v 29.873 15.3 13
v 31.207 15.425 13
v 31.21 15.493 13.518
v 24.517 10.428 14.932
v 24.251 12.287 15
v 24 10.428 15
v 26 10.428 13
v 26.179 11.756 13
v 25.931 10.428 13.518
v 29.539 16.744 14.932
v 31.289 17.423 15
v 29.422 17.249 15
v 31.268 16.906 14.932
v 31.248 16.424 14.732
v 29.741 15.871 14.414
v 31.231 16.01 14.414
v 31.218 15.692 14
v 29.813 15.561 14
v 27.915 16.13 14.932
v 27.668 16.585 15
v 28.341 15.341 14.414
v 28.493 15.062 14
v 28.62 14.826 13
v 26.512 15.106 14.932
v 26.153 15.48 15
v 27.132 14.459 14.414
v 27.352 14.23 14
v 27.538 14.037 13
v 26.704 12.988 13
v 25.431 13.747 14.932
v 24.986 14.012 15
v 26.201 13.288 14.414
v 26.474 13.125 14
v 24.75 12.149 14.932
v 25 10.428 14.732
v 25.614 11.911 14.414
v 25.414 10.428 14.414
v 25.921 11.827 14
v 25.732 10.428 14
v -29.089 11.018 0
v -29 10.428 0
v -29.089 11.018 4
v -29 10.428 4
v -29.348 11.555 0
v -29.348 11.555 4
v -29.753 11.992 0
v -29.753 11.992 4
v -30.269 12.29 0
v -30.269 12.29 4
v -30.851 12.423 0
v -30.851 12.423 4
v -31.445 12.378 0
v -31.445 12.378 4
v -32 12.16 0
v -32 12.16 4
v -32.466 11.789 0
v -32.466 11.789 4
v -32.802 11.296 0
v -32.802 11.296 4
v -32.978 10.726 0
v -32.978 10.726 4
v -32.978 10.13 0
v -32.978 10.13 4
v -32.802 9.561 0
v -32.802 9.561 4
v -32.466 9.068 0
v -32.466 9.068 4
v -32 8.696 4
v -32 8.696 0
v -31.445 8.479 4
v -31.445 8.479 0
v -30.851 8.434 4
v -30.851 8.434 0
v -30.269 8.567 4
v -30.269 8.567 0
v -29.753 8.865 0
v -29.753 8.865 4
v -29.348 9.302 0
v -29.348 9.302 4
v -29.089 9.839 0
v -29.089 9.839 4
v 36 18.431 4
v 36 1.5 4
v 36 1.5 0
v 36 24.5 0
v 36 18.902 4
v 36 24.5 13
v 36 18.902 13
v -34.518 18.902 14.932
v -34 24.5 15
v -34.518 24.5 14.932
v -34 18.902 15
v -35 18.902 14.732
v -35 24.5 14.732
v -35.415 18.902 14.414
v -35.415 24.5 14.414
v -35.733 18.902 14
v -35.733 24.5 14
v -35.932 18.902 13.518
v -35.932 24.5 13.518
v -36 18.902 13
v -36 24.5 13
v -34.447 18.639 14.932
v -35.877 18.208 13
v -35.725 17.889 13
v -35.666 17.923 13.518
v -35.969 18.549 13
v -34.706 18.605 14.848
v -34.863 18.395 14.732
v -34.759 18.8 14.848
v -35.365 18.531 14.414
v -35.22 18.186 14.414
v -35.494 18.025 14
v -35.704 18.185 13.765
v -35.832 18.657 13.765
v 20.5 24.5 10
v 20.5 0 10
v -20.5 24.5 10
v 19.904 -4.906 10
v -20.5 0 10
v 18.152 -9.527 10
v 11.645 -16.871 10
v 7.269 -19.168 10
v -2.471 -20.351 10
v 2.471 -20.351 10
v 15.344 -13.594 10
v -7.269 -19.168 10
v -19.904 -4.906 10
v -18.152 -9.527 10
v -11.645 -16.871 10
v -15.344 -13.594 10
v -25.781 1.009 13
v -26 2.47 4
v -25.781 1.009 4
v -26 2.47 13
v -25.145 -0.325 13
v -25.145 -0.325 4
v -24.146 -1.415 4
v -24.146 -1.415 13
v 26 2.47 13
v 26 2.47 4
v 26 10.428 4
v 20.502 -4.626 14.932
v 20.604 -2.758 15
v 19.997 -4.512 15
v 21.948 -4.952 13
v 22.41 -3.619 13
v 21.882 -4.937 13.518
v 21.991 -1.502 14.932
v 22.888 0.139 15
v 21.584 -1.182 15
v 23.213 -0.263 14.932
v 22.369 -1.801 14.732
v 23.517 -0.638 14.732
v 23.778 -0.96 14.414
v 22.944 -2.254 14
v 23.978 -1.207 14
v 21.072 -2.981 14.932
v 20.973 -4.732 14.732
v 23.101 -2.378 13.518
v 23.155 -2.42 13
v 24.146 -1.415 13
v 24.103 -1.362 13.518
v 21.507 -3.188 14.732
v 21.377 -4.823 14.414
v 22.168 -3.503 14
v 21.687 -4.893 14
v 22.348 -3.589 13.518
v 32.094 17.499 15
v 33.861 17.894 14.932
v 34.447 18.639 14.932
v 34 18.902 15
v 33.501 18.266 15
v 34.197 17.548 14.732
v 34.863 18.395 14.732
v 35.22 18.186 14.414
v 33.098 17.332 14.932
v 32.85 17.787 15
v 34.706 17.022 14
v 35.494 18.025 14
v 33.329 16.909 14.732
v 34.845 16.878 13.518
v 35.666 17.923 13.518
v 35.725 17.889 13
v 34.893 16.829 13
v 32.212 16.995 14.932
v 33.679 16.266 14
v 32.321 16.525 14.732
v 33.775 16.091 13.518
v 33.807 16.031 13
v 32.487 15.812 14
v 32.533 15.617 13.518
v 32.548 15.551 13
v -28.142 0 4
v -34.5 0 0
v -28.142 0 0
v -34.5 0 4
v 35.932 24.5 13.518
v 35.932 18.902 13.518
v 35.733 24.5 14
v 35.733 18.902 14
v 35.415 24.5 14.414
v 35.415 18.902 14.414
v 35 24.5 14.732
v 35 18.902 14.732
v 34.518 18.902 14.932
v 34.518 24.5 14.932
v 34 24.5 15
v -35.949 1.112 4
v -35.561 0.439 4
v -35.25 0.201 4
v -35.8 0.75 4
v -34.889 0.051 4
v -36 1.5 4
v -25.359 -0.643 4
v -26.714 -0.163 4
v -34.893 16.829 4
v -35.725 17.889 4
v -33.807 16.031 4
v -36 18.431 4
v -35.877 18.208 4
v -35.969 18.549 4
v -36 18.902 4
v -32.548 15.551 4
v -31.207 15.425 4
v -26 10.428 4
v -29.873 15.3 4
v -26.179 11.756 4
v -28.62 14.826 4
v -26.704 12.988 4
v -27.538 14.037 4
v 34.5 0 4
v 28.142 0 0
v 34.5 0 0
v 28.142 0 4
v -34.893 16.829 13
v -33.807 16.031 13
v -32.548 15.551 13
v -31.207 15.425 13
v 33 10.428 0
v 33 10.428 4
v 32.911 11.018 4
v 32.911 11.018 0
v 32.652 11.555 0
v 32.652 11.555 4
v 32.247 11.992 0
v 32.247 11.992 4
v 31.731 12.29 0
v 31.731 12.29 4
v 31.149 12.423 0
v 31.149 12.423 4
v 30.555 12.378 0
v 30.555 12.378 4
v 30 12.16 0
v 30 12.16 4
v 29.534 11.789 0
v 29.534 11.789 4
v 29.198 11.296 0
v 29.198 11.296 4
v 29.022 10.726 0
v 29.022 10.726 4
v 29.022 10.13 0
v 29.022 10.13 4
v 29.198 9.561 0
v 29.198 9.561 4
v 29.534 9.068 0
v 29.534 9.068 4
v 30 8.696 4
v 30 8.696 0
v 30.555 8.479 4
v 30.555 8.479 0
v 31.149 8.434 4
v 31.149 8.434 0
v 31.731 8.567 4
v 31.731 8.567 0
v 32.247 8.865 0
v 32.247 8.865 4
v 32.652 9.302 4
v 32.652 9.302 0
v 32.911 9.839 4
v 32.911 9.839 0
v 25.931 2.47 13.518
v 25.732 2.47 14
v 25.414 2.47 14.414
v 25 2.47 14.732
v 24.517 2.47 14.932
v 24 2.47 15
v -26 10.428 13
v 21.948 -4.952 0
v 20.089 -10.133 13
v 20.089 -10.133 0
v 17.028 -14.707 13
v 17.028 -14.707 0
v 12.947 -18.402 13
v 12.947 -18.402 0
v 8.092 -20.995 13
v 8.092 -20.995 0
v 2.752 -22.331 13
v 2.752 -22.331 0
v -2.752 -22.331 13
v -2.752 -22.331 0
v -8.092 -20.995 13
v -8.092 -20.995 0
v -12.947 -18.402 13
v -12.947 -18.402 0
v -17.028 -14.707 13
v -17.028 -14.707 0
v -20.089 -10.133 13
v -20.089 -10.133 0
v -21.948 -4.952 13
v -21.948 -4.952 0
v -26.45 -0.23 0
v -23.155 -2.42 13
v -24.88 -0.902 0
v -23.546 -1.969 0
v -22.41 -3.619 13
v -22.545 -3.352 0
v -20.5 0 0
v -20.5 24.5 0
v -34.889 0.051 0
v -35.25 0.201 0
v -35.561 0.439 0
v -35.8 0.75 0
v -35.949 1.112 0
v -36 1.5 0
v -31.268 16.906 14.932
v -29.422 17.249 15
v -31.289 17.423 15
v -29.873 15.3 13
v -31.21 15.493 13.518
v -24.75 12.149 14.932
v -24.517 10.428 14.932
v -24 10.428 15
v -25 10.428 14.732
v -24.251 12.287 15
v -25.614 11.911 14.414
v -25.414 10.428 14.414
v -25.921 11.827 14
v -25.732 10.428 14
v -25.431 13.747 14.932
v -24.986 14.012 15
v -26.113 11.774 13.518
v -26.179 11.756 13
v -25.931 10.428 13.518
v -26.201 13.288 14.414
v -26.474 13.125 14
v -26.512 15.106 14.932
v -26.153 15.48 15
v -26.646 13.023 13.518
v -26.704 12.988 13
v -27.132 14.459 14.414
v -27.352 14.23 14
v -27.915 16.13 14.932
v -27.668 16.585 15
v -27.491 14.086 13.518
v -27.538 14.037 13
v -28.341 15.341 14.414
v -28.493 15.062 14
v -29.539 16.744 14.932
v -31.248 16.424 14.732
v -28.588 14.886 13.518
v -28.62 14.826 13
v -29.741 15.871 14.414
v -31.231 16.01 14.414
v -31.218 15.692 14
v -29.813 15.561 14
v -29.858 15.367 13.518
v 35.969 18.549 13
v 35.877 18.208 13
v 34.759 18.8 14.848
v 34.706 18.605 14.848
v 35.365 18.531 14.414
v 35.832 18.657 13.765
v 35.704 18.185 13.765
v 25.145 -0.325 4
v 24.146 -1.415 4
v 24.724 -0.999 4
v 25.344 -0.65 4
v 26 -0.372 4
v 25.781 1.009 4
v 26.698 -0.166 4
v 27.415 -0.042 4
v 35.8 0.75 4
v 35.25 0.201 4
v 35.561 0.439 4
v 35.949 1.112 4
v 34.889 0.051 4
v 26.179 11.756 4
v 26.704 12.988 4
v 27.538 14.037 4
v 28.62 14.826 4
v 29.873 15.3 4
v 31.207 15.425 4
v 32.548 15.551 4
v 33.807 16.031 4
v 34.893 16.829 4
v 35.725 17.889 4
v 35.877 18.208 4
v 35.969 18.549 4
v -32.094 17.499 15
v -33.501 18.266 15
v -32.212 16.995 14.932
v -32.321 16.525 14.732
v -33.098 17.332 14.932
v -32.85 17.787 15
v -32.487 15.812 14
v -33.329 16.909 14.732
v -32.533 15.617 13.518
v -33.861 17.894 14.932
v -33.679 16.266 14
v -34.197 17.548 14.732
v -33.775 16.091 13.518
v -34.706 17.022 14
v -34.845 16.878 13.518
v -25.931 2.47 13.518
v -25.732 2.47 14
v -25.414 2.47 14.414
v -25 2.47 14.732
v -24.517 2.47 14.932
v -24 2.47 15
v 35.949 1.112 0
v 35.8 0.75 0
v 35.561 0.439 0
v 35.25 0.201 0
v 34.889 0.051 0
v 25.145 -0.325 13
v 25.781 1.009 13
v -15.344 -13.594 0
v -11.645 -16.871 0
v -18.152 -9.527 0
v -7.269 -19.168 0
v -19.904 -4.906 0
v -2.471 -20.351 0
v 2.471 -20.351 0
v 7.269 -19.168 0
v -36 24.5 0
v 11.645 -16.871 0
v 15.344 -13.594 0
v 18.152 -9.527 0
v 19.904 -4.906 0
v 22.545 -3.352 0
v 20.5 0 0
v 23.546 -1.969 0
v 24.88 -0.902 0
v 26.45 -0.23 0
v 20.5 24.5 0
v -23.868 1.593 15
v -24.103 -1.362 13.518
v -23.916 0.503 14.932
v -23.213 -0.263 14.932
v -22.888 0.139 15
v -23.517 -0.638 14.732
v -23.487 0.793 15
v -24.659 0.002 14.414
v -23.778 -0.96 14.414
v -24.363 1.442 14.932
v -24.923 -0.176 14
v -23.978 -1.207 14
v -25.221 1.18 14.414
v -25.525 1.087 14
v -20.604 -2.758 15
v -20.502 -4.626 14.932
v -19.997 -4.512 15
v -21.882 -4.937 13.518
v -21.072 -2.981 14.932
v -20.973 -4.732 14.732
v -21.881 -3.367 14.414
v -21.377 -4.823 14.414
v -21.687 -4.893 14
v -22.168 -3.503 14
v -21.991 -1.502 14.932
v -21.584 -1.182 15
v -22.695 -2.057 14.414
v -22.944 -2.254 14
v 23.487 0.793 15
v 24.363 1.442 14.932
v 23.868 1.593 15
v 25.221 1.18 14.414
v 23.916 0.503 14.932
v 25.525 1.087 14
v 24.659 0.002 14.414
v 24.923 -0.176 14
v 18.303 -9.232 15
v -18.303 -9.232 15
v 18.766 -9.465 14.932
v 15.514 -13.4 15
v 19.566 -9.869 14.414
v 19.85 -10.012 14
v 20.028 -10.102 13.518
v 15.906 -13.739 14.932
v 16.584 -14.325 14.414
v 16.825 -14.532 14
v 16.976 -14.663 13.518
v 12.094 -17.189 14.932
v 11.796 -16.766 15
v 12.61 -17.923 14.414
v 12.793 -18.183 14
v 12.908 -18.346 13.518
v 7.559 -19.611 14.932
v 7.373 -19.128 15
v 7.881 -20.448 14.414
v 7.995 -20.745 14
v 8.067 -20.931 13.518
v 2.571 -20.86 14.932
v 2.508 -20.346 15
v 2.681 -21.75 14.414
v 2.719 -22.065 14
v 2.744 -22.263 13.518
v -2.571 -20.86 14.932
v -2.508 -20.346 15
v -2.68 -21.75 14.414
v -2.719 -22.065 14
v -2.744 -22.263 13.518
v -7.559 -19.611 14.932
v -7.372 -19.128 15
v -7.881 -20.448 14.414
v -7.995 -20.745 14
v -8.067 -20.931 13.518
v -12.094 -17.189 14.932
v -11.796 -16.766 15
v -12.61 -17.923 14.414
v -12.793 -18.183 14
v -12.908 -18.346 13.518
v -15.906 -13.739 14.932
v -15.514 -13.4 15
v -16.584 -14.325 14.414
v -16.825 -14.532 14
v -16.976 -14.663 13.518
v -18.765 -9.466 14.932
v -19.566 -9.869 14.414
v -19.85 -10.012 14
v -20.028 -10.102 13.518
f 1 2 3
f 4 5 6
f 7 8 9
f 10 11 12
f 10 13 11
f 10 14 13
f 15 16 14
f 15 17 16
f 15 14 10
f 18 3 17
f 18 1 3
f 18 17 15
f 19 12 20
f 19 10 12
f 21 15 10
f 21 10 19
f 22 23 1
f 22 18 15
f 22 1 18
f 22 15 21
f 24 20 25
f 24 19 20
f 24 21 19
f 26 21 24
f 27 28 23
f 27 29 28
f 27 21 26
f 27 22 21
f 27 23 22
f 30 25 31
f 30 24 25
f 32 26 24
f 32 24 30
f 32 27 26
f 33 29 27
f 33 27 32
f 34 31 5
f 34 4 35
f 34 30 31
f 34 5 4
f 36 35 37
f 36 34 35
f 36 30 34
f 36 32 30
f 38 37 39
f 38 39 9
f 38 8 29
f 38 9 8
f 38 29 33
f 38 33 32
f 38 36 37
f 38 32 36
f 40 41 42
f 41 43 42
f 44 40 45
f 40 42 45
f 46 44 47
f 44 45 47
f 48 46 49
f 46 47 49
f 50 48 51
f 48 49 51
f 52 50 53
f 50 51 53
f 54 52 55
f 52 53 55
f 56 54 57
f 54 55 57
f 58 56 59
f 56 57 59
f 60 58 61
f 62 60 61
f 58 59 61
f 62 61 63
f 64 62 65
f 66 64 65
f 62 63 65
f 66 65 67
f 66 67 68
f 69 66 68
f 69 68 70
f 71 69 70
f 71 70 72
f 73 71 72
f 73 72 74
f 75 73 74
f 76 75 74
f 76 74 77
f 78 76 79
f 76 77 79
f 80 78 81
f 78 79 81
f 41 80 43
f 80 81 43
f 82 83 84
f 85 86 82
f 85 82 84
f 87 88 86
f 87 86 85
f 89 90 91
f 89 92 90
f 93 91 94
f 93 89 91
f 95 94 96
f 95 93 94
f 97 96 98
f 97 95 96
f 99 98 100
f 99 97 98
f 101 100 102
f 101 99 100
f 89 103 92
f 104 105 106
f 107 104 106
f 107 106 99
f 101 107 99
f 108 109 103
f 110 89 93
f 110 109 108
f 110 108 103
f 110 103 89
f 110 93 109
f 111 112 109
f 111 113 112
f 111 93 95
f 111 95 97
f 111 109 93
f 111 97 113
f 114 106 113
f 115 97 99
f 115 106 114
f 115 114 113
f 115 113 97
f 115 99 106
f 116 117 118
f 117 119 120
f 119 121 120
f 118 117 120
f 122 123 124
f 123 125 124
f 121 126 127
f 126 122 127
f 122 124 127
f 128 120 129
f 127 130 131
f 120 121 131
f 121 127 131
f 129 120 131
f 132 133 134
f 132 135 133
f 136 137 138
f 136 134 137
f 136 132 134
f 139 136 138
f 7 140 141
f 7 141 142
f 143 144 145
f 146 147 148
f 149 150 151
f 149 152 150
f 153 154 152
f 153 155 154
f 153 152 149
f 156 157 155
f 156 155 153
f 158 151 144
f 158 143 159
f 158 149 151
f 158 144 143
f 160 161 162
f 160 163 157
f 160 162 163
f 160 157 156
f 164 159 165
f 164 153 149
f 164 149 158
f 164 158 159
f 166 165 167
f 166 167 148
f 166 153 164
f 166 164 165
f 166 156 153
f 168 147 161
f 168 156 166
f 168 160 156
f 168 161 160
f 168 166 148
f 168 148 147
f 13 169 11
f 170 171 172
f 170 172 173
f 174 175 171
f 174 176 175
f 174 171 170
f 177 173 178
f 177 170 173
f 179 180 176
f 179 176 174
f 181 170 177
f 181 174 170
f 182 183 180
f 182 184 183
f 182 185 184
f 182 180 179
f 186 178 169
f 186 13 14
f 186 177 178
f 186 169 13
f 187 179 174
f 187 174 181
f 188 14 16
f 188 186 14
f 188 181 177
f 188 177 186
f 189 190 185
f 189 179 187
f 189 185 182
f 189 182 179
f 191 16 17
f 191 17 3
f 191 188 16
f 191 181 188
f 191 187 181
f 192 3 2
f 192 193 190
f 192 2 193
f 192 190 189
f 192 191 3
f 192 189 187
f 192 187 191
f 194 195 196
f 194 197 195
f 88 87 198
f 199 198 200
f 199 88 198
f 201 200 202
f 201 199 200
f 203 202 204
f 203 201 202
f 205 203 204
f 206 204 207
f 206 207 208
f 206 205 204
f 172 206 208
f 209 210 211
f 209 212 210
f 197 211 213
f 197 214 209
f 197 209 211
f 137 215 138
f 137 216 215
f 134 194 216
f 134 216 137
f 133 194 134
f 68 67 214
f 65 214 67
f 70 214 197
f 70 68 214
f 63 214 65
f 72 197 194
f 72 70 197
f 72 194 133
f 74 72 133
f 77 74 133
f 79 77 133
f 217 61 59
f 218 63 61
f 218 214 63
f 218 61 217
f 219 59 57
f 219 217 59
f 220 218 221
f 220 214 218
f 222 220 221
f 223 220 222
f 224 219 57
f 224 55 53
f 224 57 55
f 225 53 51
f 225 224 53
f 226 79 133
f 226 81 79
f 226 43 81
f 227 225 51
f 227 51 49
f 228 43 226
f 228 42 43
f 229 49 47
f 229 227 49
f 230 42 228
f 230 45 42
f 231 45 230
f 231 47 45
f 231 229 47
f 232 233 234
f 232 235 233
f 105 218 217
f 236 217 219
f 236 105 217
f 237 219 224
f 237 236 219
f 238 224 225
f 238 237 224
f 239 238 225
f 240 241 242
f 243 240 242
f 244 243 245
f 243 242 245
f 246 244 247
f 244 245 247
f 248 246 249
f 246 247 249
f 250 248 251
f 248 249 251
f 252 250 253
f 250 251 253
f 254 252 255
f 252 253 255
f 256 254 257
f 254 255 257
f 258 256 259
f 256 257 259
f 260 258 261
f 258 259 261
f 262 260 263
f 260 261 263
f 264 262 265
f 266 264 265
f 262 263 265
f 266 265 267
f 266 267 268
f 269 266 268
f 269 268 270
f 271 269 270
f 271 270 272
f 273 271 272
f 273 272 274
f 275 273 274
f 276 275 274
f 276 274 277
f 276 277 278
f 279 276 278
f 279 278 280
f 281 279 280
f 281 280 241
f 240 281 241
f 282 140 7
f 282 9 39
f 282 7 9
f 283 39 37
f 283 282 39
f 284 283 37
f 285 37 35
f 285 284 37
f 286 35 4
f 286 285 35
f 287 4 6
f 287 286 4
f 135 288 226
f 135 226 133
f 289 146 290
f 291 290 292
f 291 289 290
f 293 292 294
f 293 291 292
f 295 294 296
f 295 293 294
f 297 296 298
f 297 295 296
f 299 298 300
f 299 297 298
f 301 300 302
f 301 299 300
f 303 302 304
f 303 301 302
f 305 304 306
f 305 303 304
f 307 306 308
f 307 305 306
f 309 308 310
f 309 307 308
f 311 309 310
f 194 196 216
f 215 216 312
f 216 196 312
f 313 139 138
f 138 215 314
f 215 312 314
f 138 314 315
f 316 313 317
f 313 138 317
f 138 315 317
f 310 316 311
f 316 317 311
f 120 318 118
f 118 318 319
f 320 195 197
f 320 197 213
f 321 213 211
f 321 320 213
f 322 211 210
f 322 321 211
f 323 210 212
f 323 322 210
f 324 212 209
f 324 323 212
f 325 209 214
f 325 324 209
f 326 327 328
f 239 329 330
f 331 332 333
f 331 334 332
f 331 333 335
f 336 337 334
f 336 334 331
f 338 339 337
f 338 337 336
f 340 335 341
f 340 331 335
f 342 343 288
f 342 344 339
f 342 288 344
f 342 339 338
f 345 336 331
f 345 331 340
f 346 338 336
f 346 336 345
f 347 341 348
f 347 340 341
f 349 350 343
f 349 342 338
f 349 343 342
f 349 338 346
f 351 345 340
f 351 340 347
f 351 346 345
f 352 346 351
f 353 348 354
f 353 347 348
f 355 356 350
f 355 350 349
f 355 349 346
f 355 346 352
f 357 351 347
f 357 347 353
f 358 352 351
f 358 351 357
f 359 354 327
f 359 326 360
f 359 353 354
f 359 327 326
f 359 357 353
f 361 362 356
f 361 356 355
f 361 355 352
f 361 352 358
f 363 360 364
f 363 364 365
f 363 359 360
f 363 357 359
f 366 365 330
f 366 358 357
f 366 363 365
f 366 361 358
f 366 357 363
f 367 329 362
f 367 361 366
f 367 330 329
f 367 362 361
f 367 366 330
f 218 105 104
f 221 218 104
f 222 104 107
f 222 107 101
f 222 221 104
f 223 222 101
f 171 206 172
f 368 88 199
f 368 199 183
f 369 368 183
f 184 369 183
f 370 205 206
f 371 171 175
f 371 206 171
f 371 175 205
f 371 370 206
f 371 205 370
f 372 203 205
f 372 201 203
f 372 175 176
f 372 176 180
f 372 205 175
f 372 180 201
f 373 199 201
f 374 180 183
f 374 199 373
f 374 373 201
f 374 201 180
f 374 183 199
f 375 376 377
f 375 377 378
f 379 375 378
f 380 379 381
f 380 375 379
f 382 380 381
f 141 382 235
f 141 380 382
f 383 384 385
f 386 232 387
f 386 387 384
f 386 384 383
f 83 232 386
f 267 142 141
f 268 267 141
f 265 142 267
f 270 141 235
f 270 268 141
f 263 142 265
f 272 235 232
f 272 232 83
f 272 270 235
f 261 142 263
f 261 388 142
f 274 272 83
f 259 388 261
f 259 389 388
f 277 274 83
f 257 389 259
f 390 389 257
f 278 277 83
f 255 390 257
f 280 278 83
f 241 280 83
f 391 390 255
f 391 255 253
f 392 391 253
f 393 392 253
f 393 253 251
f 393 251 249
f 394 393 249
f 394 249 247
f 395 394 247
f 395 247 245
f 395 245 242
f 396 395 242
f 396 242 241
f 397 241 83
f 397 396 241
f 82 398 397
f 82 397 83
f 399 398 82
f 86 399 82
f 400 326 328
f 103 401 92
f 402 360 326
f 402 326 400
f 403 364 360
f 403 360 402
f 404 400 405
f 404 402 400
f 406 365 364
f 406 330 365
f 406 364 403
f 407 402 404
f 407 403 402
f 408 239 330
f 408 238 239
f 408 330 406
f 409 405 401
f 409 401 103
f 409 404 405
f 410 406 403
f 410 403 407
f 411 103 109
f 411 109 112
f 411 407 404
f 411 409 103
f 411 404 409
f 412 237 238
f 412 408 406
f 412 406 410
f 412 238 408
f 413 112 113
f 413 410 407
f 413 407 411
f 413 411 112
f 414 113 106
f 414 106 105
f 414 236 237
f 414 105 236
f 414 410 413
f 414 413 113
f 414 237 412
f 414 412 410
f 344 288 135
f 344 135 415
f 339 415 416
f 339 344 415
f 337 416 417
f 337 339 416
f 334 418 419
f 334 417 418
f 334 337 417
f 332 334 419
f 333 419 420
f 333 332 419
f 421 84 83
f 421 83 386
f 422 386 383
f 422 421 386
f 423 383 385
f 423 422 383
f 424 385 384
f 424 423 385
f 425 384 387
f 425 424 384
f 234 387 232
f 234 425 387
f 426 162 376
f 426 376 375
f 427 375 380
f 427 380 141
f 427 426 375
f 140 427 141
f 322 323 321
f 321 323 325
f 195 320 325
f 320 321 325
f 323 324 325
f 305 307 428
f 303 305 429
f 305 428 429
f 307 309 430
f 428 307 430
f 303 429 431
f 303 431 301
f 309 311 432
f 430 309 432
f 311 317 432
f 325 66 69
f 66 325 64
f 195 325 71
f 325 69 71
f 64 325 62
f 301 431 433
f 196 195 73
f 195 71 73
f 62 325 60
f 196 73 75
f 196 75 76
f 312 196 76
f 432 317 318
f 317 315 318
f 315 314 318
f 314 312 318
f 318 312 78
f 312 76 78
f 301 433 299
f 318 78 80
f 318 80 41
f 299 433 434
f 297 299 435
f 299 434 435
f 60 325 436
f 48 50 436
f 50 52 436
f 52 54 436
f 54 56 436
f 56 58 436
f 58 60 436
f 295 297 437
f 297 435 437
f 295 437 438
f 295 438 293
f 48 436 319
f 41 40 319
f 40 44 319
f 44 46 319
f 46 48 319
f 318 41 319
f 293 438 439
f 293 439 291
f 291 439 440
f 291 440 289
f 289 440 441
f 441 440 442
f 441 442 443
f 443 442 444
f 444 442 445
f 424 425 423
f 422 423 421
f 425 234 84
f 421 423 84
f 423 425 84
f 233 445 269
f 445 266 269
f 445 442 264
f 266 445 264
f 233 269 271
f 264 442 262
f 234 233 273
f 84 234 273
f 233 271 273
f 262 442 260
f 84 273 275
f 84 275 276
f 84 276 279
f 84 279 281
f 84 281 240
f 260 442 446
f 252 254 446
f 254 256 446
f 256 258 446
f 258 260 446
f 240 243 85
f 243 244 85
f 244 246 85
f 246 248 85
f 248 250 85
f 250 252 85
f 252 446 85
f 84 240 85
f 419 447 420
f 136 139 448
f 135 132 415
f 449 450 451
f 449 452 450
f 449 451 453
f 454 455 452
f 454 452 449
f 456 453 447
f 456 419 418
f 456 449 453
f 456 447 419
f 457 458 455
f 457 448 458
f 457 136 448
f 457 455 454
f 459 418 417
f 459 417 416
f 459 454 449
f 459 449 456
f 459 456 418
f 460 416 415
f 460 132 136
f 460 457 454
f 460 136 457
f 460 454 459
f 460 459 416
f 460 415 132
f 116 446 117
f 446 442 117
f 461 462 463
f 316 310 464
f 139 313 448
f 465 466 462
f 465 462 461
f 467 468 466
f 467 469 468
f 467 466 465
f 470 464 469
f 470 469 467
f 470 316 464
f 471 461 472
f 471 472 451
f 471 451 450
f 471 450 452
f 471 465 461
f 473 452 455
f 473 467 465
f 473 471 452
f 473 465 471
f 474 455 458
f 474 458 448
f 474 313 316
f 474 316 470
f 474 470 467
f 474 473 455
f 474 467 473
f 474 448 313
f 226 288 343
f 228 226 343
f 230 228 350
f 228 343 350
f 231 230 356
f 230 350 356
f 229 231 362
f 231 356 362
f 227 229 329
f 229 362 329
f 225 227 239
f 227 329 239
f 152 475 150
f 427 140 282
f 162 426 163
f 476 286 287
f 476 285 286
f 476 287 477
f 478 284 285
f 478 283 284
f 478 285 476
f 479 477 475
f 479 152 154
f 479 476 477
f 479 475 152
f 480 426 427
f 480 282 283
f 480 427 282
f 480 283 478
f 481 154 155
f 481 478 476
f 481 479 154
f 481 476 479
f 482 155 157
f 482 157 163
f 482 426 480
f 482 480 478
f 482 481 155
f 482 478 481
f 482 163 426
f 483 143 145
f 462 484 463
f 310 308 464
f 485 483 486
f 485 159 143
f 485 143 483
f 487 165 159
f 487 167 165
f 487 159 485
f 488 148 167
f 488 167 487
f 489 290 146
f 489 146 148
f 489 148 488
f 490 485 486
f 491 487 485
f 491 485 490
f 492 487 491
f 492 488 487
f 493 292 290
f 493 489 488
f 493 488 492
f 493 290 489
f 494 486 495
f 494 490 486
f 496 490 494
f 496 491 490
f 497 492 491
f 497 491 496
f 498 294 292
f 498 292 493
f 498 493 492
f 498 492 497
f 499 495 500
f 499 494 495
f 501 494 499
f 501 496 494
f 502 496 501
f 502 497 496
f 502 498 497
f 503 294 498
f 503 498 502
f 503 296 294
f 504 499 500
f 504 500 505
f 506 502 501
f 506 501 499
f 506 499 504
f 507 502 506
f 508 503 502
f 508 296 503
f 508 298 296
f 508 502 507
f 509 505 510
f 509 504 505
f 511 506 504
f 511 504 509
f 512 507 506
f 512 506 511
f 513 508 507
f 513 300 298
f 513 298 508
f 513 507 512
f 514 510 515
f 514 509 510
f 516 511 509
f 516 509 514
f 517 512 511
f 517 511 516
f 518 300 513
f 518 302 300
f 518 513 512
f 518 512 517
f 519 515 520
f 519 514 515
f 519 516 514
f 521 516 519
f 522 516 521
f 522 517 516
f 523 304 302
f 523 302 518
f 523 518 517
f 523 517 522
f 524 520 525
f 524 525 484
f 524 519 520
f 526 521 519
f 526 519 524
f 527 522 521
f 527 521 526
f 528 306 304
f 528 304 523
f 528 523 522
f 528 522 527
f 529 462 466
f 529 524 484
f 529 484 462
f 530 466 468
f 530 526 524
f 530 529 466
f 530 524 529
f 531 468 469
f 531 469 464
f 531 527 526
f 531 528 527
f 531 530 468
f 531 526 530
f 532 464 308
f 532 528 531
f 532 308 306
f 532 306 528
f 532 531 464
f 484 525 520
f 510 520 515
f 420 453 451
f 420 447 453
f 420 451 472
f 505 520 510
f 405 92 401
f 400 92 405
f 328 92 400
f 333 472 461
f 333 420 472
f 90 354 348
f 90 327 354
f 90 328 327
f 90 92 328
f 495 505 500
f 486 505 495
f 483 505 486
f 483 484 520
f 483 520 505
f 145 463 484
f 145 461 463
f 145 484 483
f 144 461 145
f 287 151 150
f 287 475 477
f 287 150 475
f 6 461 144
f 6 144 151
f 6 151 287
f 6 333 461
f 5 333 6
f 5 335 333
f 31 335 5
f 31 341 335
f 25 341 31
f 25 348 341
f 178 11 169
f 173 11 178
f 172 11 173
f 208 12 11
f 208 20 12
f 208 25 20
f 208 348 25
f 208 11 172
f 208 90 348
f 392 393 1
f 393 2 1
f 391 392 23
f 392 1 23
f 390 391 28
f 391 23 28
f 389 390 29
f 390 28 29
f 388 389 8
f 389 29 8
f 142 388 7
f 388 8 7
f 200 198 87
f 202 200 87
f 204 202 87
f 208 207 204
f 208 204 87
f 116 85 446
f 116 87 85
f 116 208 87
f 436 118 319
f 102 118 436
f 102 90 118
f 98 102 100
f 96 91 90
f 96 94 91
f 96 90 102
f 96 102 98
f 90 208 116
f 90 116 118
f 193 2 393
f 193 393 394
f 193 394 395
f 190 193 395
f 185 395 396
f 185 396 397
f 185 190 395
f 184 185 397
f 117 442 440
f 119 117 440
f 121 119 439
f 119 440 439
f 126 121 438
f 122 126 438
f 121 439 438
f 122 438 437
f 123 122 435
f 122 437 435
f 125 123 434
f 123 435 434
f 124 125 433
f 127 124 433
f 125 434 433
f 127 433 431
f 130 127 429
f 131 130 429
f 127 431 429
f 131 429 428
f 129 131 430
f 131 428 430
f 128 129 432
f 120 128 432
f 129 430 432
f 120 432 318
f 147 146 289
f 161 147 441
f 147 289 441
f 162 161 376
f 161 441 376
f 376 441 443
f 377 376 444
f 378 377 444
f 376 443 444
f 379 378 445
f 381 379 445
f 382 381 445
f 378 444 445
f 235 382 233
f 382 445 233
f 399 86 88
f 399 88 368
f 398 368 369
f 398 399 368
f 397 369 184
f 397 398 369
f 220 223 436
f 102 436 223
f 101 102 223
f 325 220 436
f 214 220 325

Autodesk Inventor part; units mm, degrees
ref_plane "YZ Plane" through (0, 0, 0) normal (1, 0, 0) x (0, 1, 0)
ref_plane "XZ Plane" through (0, 0, 0) normal (0, 1, 0) x (-1, 0, 0)
ref_plane "XY Plane" through (0, 0, 0) normal (0, 0, 1) x (1, 0, 0)
sketch "Эскиз3" plane through (0, 0, 0) normal (0, 0, 1) x (1, 0, 0)
  line L0 (36, 19) -> (-36, 19)
  line L1 (-36, 19) -> (-36, 1.5)
  arc A0 (-36, 1.5) -> (-34.5, 0) centre (-34.5, 1.5) ccw
  line L2 (-34.5, 0) -> (-28.1425, 0)
  arc A1 (-21.9482, -4.9523) -> (-28.1425, 0) centre (-28.1425, -6.35) ccw
  arc A2 (-21.9482, -4.9523) -> (21.9482, -4.9523) centre (0, 0) ccw
  arc A3 (28.1425, 0) -> (21.9482, -4.9523) centre (28.1425, -6.35) ccw
  line L3 (34.5, 0) -> (28.1425, 0)
  arc A4 (34.5, 0) -> (36, 1.5) centre (34.5, 1.5) ccw
  line L4 (36, 19) -> (36, 1.5)
  circle A5 centre (0, 0) radius 18.5
  line L5 (-28.1425, 0) -> (-28.1425, 19)
  line L6 (28.1425, 0) -> (28.1425, 19)
extrude "Выдавливание3" add sketch "Эскиз3" along normal blind 15 contours L6 A3 A2 A1 L5 L0 | A5
sketch "Эскиз4" plane through (0, 0, 0) normal (0, 0, -1) x (-1, 0, 0)
  line L0 (36, 19) -> (-36, 19)
  line L1 (-36, 19) -> (-36, 1.5)
  arc A0 (-36, 1.5) -> (-34.5, 0) centre (-34.5, 1.5) ccw
  line L2 (-34.5, 0) -> (-28.1425, 0)
  arc A1 (-21.9482, -4.9523) -> (-28.1425, 0) centre (-28.1425, -6.35) ccw
  arc A2 (-21.9482, -4.9523) -> (21.9482, -4.9523) centre (0, 0) ccw
  arc A3 (28.1425, 0) -> (21.9482, -4.9523) centre (28.1425, -6.35) ccw
  line L3 (34.5, 0) -> (28.1425, 0)
  arc A4 (34.5, 0) -> (36, 1.5) centre (34.5, 1.5) ccw
  line L4 (36, 19) -> (36, 1.5)
  circle A5 centre (0, 0) radius 18.5
  line L5 (-28.1425, 0) -> (-28.1425, 19)
  line L6 (28.1425, 0) -> (28.1425, 19)
  line L7 (-18.5, 0) -> (-18.5, 19)
  line L8 (-28.1425, 19) -> (28.1425, 19) projected
  line L9 (18.5, 0) -> (18.5, 19)
extrude "Выдавливание4" cut sketch "Эскиз4" against normal blind 10 contours L9 A5 L7 L0 | A5
offset faces "Размер1" outward -2 faces at (18.5, 12.6667, 6.6667) (-18.44, -1.4886, 6.6667) (-18.5, 6.3333, 6.6667)
offset faces "Размер2" outward 5.5 faces at (6.8333, 19, 13.3333)
sketch "Эскиз6" plane through (0, 0, 15) normal (0, 0, 1) x (1, 0, 0)
  line L0 (-28.1425, 24.5) -> (-36.0005, 24.5)
  line L1 (-36.0005, 24.5) -> (-36.0005, 0)
  line L2 (-36.0005, 0) -> (-28.1425, 0)
  line L3 (-28.1425, 0) -> (-28.1425, 24.5)
  point P0 (0, 0)
  dimension "d13" = 7.858
extrude "Выдавливание6" add sketch "Эскиз6" against normal up to surface (15 mm away)
mirror "Зеркальное отражение1" about plane through (0, 0, 0) normal (1, 0, 0) of "Выдавливание6"
sketch "Эскиз5" plane through (0, 0, 15) normal (0, 0, 1) x (1, 0, 0)
  circle A0 centre (-31, 10.4284) radius 2 projected
  circle A1 centre (31, 10.4284) radius 2 projected
  point P0 (0, 0)
extrude "Выдавливание5" cut sketch "Эскиз5" against normal through all
sketch "Эскиз7" plane through (0, 0, 15) normal (0, 0, 1) x (1, 0, 0)
  circle A0 centre (-31, 10.4284) radius 2 projected
  circle A1 centre (-31, 10.4284) radius 5.0005
  line L0 (-36.0005, 24.5) -> (-36.0005, 0) projected
  circle A2 centre (31, 10.4284) radius 2 projected
  circle A3 centre (31, 10.4284) radius 5.0005
  line L1 (36.0005, 24.5) -> (36.0005, 0) projected
  arc A4 (-36.0005, 18.4308) -> (-33.5949, 14.7029) centre (-27.8544, 21.0474) ccw
  line L2 (-31, 10.4284) -> (-36.0005, 10.4284) construction
  line L3 (-25.9995, 10.4284) -> (-25.9995, -0.3725)
  arc A5 (-21.9482, -4.9523) -> (-28.1425, 0) centre (-28.1425, -6.35) ccw projected
  line L4 (-36.0005, 0) -> (-28.1425, 0) projected
  point P0 (0, 0)
  point P1 (-33.5949, 6.1538)
  point P2 (-36.0005, 2.4259)
extrude "Выдавливание7" cut sketch "Эскиз7" against normal blind 11 contours A1 | L3 A5 L4 L0 A1 | A1 L0 A4
mirror "Зеркальное отражение2" about plane through (0, 0, 0) normal (1, 0, 0) of "Выдавливание7"
fillet "Сопряжение6" radius 5 4 edges at (-33.5949, 14.7029, 9.5) (33.5949, 14.7029, 9.5) (25.9995, -0.3725, 9.5) (-25.9995, -0.3725, 9.5)
fillet "Сопряжение7" radius 1.5 2 edges at (-36.0005, 0, 2) (36.0005, 0, 2)
fillet "Сопряжение8" radius 2 13 edges at (-27.538, 14.0366, 15) (-25.9995, 6.4494, 15) (-25.5125, 0.3179, 15) (-22.749, -2.9985, 15) (0, -22.5, 15) (22.749, -2.9985, 15) (25.5125, 0.3179, 15) (25.9995, 6.4494, 15) (27.538, 14.0366, 15) (-36.0005, 21.4654, 15) (36.0005, 21.4654, 15) (36.0005, 18.4308, 9.5) (-36.0005, 18.4308, 9.5)
properties part number "000.002.002 - Крышка мотора задняя"
